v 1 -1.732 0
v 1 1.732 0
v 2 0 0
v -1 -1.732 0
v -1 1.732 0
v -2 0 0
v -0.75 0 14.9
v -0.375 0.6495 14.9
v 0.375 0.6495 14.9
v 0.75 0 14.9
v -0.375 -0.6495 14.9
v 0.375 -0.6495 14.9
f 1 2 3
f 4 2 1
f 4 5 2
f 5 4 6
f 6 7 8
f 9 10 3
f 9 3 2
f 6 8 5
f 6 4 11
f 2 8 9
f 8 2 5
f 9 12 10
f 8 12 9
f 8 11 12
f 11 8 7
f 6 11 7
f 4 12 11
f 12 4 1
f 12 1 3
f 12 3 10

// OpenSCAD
// Cookie Cutter renders a DXF file as a cookie cutter.
// by Mike Koss (c) 2013

E = 0.1;
FILE = "club.dxf";

module cookie_cutter() {
  outline(15, 2, 0.75) child(0);
  //outline(2, 6, 2) child(0);
  intersection() {
    linear_extrude(height=2)
      child(0);
    grid(100, 100, 10, 2);
  }
}

module outline(height, base, top) {
  difference() {
    minkowski() {
      linear_extrude(height=E)
        child(0);
      cylinder(r1=base, r2=top, h=height - E, $fn=6);
    }
    translate([0, 0, -E])
      linear_extrude(height=height + 2 * E)
        child(0);
  }
}

module grid(x, y, d, thickness) {
  cx = floor(x / d);
  cy = floor(y / d);
  for (ix = [0: cx]) {
    translate([ix * d, 0, 0])
      cube([thickness, y + thickness, thickness]);
  }
  for (iy = [0: cy]) {
    translate([0, iy * d, 0])
      cube([x + thickness, thickness, thickness]);
  }
}

cookie_cutter() import(file=FILE);
